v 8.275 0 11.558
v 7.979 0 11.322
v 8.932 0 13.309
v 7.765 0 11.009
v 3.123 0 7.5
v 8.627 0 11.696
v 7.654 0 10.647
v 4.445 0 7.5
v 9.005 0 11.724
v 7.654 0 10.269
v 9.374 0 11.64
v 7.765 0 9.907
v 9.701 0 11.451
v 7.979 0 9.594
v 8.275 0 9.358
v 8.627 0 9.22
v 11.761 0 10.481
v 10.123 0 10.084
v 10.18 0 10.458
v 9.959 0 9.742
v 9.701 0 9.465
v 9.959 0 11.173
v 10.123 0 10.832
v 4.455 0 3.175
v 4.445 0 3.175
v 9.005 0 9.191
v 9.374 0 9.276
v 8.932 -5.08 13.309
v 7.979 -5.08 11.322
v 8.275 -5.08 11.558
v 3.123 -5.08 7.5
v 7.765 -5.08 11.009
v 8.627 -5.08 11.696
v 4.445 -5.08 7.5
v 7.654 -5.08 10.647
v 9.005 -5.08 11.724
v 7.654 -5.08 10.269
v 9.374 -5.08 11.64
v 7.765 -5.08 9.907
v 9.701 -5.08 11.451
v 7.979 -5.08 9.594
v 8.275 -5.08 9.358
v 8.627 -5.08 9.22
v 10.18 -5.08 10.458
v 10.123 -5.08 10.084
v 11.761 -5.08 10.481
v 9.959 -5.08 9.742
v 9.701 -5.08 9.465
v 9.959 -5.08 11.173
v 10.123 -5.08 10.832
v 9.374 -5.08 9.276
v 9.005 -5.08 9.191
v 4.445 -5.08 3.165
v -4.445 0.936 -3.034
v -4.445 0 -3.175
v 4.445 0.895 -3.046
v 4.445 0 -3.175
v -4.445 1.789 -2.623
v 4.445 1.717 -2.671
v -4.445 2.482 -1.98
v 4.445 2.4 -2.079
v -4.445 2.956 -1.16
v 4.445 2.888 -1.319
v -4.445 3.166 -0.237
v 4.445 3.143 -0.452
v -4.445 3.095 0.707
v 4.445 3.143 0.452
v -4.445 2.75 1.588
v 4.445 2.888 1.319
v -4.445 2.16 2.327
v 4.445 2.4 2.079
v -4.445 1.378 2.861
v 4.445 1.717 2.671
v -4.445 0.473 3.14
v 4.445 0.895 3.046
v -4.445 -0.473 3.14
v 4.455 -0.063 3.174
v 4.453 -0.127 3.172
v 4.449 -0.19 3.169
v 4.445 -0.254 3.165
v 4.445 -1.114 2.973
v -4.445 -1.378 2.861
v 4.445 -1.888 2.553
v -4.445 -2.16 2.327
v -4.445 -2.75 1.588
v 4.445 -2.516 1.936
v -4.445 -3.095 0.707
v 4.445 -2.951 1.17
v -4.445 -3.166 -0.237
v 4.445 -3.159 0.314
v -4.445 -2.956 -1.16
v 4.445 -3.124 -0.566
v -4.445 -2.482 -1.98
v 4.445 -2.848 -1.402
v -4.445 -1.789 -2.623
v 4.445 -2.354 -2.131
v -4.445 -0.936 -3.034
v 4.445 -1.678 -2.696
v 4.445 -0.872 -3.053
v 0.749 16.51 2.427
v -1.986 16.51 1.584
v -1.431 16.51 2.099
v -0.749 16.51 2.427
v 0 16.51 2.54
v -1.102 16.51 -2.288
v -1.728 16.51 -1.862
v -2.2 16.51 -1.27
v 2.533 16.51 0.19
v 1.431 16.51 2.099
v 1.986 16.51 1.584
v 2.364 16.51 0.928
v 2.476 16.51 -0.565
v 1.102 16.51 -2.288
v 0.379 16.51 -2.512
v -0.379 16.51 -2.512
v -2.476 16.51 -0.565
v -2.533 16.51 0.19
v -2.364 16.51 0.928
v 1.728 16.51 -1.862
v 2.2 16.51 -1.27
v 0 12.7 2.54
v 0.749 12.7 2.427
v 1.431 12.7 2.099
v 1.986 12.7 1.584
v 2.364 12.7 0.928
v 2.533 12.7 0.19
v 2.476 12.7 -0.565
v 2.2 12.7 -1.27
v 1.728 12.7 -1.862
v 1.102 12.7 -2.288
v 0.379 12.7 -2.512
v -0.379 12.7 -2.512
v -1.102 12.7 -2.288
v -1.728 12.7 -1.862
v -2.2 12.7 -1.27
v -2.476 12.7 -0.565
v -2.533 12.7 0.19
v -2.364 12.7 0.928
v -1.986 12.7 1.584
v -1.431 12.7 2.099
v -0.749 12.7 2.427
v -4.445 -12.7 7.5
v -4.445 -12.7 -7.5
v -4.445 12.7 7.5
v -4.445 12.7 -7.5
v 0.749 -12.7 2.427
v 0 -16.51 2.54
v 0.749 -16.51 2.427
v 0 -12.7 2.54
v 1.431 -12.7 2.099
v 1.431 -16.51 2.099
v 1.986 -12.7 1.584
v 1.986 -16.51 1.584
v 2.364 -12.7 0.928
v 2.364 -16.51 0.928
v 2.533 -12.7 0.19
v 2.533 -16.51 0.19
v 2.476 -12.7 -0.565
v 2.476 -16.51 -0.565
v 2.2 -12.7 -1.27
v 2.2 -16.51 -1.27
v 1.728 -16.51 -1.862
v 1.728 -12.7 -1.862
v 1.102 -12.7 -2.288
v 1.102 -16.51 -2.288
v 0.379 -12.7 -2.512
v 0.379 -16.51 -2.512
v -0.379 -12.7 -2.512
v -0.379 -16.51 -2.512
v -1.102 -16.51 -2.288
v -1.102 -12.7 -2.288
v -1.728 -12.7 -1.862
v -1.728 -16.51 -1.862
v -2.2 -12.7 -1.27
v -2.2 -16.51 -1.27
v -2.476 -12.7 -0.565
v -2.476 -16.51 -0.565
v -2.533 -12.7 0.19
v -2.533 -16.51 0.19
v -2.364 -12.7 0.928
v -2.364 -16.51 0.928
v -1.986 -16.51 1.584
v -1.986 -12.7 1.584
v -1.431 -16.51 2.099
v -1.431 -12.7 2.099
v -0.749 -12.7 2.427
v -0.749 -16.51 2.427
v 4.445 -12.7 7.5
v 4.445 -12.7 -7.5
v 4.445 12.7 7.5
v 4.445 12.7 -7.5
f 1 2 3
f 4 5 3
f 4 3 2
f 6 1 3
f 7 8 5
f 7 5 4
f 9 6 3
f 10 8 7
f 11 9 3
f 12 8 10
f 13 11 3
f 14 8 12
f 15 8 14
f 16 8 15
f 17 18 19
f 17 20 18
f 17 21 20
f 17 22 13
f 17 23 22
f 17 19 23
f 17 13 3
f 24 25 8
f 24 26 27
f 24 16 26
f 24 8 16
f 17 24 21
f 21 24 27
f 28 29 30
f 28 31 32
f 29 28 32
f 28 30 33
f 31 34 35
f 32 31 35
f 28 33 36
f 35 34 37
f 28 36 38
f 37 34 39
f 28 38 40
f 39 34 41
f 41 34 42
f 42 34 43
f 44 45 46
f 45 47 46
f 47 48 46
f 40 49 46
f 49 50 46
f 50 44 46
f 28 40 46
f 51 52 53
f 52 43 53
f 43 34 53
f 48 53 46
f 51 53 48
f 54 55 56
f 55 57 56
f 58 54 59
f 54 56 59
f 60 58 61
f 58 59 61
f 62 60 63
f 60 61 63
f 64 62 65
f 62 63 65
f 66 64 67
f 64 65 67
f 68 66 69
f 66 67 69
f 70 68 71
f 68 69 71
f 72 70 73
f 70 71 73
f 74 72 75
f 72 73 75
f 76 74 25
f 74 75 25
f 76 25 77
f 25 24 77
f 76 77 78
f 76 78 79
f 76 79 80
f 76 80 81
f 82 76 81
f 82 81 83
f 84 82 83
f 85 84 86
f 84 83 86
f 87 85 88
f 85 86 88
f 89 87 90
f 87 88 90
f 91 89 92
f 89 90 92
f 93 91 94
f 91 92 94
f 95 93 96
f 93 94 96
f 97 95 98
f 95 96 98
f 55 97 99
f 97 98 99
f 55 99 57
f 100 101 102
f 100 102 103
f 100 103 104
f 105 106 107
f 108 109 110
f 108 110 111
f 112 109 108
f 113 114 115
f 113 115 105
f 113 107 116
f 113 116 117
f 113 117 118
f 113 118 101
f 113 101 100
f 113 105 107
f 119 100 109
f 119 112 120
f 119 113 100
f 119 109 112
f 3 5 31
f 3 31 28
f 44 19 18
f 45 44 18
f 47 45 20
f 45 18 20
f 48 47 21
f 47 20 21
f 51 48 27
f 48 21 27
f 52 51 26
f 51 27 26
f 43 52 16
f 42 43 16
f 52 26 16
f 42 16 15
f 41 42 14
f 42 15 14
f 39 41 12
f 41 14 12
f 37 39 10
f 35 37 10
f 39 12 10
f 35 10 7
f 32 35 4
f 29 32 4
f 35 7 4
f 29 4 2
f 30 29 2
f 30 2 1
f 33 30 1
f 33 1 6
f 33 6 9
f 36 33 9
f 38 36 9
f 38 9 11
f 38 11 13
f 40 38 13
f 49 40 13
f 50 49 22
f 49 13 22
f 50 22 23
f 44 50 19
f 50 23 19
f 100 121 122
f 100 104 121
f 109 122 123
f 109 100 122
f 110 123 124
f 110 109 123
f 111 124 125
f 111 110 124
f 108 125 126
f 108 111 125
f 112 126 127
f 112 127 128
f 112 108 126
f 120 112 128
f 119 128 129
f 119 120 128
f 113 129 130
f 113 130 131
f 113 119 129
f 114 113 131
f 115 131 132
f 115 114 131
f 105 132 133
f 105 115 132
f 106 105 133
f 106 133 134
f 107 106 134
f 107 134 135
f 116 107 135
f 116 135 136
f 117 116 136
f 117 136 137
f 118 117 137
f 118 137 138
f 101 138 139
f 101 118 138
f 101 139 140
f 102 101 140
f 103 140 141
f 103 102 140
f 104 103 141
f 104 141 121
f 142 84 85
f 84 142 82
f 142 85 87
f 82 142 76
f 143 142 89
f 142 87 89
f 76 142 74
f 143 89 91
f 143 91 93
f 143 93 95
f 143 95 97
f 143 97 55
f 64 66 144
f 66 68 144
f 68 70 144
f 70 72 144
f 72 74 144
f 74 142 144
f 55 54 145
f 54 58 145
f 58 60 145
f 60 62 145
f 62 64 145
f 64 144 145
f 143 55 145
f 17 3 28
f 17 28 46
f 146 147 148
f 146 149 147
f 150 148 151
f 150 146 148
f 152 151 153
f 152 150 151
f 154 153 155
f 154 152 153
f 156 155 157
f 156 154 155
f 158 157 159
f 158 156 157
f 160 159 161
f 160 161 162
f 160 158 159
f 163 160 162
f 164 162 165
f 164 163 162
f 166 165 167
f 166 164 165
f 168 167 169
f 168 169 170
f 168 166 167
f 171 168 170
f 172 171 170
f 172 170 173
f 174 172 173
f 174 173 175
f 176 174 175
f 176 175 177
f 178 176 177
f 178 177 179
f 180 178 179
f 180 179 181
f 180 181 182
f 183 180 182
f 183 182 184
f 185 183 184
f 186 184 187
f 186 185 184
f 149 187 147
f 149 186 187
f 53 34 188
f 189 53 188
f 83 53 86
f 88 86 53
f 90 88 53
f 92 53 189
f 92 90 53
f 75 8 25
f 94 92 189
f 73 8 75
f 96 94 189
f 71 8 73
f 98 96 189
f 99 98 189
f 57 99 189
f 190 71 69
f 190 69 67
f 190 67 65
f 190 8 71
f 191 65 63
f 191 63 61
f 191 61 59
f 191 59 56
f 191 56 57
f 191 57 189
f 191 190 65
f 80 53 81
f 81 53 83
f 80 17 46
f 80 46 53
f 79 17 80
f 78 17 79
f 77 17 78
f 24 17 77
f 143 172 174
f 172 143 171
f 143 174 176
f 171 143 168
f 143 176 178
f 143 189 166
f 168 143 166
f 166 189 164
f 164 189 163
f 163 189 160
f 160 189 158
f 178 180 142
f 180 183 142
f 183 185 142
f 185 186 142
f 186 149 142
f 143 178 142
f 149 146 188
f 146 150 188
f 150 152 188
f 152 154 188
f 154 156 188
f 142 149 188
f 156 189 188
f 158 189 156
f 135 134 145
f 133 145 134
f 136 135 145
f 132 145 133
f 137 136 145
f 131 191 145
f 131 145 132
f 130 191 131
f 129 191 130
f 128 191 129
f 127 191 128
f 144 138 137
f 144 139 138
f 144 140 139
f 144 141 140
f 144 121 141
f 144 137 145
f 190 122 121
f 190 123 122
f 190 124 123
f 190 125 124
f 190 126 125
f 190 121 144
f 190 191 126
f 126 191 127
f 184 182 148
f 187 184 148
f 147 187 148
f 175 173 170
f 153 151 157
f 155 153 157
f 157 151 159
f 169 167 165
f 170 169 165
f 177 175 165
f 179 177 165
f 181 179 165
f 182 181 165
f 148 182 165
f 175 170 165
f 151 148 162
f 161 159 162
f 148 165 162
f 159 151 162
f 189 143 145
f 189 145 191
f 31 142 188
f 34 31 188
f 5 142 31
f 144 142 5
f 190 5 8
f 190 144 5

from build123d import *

# Parameters (mm, degrees)
SKETCH1_W                = 8.89
SKETCH1_H                = 14.999999972
BOSS_EXTRUDE1_DEPTH      = 16.51
BOSS_EXTRUDE1_DEPTH_BACK = 16.51
SKETCH1_3_R              = 1.27
BOSS_EXTRUDE2_DEPTH      = 5.08
SKETCH3_W                = 16.776229269
SKETCH3_H                = 3.81
SKETCH4_R                = 3.175
CUT_EXTRUDE1_DEPTH       = 12.76066318
CUT_EXTRUDE1_DEPTH_BACK  = 5.445


with BuildPart() as part:
    # Sketch1 → Boss-Extrude1 (new body, two sides)
    with BuildSketch(Plane(origin=(0, 0, 0), x_dir=(1, 0, 0), z_dir=(0, 1, 0))) as boss_extrude1_sk:
        Rectangle(SKETCH1_W, SKETCH1_H)
    extrude(amount=BOSS_EXTRUDE1_DEPTH)
    extrude(boss_extrude1_sk.sketch, amount=-BOSS_EXTRUDE1_DEPTH_BACK)

    # Sketch1_3 → Boss-Extrude2 (add)
    with BuildSketch(Plane(origin=(0, 0, 0), x_dir=(1, 0, 0), z_dir=(0, 1, 0))):
        Polygon((11.76066318, -10.480507782), (4.445, -3.164844602), (4.445, -7.499999986), (3.123301134, -7.499999986), (8.932236056, -13.308934907), align=None)
        with Locations((8.909608639, -10.457880365)):
            Circle(SKETCH1_3_R, mode=Mode.SUBTRACT)
    extrude(amount=-BOSS_EXTRUDE2_DEPTH)

    # Sketch3 → Cut-Revolve1 (revolve, cut)
    with BuildSketch(Plane(origin=(0, 0, 0), x_dir=(0, 0, -1), z_dir=(1, 0, 0))):
        with Locations((-10.928114634, 14.605)):
            Rectangle(SKETCH3_W, SKETCH3_H)
        with Locations((-10.928114634, -14.605)):
            Rectangle(SKETCH3_W, SKETCH3_H)
    revolve(axis=Axis((0, 0, 0), (0, 1, 0)), mode=Mode.SUBTRACT)

    # Sketch4 → Cut-Extrude1 (cut, two sides)
    with BuildSketch(Plane(origin=(0, 0, 0), x_dir=(0, 0, -1), z_dir=(1, 0, 0))) as cut_extrude1_sk:
        Circle(SKETCH4_R)
    extrude(amount=CUT_EXTRUDE1_DEPTH, mode=Mode.SUBTRACT)
    extrude(cut_extrude1_sk.sketch, amount=-CUT_EXTRUDE1_DEPTH_BACK, mode=Mode.SUBTRACT)


solid = part.part
